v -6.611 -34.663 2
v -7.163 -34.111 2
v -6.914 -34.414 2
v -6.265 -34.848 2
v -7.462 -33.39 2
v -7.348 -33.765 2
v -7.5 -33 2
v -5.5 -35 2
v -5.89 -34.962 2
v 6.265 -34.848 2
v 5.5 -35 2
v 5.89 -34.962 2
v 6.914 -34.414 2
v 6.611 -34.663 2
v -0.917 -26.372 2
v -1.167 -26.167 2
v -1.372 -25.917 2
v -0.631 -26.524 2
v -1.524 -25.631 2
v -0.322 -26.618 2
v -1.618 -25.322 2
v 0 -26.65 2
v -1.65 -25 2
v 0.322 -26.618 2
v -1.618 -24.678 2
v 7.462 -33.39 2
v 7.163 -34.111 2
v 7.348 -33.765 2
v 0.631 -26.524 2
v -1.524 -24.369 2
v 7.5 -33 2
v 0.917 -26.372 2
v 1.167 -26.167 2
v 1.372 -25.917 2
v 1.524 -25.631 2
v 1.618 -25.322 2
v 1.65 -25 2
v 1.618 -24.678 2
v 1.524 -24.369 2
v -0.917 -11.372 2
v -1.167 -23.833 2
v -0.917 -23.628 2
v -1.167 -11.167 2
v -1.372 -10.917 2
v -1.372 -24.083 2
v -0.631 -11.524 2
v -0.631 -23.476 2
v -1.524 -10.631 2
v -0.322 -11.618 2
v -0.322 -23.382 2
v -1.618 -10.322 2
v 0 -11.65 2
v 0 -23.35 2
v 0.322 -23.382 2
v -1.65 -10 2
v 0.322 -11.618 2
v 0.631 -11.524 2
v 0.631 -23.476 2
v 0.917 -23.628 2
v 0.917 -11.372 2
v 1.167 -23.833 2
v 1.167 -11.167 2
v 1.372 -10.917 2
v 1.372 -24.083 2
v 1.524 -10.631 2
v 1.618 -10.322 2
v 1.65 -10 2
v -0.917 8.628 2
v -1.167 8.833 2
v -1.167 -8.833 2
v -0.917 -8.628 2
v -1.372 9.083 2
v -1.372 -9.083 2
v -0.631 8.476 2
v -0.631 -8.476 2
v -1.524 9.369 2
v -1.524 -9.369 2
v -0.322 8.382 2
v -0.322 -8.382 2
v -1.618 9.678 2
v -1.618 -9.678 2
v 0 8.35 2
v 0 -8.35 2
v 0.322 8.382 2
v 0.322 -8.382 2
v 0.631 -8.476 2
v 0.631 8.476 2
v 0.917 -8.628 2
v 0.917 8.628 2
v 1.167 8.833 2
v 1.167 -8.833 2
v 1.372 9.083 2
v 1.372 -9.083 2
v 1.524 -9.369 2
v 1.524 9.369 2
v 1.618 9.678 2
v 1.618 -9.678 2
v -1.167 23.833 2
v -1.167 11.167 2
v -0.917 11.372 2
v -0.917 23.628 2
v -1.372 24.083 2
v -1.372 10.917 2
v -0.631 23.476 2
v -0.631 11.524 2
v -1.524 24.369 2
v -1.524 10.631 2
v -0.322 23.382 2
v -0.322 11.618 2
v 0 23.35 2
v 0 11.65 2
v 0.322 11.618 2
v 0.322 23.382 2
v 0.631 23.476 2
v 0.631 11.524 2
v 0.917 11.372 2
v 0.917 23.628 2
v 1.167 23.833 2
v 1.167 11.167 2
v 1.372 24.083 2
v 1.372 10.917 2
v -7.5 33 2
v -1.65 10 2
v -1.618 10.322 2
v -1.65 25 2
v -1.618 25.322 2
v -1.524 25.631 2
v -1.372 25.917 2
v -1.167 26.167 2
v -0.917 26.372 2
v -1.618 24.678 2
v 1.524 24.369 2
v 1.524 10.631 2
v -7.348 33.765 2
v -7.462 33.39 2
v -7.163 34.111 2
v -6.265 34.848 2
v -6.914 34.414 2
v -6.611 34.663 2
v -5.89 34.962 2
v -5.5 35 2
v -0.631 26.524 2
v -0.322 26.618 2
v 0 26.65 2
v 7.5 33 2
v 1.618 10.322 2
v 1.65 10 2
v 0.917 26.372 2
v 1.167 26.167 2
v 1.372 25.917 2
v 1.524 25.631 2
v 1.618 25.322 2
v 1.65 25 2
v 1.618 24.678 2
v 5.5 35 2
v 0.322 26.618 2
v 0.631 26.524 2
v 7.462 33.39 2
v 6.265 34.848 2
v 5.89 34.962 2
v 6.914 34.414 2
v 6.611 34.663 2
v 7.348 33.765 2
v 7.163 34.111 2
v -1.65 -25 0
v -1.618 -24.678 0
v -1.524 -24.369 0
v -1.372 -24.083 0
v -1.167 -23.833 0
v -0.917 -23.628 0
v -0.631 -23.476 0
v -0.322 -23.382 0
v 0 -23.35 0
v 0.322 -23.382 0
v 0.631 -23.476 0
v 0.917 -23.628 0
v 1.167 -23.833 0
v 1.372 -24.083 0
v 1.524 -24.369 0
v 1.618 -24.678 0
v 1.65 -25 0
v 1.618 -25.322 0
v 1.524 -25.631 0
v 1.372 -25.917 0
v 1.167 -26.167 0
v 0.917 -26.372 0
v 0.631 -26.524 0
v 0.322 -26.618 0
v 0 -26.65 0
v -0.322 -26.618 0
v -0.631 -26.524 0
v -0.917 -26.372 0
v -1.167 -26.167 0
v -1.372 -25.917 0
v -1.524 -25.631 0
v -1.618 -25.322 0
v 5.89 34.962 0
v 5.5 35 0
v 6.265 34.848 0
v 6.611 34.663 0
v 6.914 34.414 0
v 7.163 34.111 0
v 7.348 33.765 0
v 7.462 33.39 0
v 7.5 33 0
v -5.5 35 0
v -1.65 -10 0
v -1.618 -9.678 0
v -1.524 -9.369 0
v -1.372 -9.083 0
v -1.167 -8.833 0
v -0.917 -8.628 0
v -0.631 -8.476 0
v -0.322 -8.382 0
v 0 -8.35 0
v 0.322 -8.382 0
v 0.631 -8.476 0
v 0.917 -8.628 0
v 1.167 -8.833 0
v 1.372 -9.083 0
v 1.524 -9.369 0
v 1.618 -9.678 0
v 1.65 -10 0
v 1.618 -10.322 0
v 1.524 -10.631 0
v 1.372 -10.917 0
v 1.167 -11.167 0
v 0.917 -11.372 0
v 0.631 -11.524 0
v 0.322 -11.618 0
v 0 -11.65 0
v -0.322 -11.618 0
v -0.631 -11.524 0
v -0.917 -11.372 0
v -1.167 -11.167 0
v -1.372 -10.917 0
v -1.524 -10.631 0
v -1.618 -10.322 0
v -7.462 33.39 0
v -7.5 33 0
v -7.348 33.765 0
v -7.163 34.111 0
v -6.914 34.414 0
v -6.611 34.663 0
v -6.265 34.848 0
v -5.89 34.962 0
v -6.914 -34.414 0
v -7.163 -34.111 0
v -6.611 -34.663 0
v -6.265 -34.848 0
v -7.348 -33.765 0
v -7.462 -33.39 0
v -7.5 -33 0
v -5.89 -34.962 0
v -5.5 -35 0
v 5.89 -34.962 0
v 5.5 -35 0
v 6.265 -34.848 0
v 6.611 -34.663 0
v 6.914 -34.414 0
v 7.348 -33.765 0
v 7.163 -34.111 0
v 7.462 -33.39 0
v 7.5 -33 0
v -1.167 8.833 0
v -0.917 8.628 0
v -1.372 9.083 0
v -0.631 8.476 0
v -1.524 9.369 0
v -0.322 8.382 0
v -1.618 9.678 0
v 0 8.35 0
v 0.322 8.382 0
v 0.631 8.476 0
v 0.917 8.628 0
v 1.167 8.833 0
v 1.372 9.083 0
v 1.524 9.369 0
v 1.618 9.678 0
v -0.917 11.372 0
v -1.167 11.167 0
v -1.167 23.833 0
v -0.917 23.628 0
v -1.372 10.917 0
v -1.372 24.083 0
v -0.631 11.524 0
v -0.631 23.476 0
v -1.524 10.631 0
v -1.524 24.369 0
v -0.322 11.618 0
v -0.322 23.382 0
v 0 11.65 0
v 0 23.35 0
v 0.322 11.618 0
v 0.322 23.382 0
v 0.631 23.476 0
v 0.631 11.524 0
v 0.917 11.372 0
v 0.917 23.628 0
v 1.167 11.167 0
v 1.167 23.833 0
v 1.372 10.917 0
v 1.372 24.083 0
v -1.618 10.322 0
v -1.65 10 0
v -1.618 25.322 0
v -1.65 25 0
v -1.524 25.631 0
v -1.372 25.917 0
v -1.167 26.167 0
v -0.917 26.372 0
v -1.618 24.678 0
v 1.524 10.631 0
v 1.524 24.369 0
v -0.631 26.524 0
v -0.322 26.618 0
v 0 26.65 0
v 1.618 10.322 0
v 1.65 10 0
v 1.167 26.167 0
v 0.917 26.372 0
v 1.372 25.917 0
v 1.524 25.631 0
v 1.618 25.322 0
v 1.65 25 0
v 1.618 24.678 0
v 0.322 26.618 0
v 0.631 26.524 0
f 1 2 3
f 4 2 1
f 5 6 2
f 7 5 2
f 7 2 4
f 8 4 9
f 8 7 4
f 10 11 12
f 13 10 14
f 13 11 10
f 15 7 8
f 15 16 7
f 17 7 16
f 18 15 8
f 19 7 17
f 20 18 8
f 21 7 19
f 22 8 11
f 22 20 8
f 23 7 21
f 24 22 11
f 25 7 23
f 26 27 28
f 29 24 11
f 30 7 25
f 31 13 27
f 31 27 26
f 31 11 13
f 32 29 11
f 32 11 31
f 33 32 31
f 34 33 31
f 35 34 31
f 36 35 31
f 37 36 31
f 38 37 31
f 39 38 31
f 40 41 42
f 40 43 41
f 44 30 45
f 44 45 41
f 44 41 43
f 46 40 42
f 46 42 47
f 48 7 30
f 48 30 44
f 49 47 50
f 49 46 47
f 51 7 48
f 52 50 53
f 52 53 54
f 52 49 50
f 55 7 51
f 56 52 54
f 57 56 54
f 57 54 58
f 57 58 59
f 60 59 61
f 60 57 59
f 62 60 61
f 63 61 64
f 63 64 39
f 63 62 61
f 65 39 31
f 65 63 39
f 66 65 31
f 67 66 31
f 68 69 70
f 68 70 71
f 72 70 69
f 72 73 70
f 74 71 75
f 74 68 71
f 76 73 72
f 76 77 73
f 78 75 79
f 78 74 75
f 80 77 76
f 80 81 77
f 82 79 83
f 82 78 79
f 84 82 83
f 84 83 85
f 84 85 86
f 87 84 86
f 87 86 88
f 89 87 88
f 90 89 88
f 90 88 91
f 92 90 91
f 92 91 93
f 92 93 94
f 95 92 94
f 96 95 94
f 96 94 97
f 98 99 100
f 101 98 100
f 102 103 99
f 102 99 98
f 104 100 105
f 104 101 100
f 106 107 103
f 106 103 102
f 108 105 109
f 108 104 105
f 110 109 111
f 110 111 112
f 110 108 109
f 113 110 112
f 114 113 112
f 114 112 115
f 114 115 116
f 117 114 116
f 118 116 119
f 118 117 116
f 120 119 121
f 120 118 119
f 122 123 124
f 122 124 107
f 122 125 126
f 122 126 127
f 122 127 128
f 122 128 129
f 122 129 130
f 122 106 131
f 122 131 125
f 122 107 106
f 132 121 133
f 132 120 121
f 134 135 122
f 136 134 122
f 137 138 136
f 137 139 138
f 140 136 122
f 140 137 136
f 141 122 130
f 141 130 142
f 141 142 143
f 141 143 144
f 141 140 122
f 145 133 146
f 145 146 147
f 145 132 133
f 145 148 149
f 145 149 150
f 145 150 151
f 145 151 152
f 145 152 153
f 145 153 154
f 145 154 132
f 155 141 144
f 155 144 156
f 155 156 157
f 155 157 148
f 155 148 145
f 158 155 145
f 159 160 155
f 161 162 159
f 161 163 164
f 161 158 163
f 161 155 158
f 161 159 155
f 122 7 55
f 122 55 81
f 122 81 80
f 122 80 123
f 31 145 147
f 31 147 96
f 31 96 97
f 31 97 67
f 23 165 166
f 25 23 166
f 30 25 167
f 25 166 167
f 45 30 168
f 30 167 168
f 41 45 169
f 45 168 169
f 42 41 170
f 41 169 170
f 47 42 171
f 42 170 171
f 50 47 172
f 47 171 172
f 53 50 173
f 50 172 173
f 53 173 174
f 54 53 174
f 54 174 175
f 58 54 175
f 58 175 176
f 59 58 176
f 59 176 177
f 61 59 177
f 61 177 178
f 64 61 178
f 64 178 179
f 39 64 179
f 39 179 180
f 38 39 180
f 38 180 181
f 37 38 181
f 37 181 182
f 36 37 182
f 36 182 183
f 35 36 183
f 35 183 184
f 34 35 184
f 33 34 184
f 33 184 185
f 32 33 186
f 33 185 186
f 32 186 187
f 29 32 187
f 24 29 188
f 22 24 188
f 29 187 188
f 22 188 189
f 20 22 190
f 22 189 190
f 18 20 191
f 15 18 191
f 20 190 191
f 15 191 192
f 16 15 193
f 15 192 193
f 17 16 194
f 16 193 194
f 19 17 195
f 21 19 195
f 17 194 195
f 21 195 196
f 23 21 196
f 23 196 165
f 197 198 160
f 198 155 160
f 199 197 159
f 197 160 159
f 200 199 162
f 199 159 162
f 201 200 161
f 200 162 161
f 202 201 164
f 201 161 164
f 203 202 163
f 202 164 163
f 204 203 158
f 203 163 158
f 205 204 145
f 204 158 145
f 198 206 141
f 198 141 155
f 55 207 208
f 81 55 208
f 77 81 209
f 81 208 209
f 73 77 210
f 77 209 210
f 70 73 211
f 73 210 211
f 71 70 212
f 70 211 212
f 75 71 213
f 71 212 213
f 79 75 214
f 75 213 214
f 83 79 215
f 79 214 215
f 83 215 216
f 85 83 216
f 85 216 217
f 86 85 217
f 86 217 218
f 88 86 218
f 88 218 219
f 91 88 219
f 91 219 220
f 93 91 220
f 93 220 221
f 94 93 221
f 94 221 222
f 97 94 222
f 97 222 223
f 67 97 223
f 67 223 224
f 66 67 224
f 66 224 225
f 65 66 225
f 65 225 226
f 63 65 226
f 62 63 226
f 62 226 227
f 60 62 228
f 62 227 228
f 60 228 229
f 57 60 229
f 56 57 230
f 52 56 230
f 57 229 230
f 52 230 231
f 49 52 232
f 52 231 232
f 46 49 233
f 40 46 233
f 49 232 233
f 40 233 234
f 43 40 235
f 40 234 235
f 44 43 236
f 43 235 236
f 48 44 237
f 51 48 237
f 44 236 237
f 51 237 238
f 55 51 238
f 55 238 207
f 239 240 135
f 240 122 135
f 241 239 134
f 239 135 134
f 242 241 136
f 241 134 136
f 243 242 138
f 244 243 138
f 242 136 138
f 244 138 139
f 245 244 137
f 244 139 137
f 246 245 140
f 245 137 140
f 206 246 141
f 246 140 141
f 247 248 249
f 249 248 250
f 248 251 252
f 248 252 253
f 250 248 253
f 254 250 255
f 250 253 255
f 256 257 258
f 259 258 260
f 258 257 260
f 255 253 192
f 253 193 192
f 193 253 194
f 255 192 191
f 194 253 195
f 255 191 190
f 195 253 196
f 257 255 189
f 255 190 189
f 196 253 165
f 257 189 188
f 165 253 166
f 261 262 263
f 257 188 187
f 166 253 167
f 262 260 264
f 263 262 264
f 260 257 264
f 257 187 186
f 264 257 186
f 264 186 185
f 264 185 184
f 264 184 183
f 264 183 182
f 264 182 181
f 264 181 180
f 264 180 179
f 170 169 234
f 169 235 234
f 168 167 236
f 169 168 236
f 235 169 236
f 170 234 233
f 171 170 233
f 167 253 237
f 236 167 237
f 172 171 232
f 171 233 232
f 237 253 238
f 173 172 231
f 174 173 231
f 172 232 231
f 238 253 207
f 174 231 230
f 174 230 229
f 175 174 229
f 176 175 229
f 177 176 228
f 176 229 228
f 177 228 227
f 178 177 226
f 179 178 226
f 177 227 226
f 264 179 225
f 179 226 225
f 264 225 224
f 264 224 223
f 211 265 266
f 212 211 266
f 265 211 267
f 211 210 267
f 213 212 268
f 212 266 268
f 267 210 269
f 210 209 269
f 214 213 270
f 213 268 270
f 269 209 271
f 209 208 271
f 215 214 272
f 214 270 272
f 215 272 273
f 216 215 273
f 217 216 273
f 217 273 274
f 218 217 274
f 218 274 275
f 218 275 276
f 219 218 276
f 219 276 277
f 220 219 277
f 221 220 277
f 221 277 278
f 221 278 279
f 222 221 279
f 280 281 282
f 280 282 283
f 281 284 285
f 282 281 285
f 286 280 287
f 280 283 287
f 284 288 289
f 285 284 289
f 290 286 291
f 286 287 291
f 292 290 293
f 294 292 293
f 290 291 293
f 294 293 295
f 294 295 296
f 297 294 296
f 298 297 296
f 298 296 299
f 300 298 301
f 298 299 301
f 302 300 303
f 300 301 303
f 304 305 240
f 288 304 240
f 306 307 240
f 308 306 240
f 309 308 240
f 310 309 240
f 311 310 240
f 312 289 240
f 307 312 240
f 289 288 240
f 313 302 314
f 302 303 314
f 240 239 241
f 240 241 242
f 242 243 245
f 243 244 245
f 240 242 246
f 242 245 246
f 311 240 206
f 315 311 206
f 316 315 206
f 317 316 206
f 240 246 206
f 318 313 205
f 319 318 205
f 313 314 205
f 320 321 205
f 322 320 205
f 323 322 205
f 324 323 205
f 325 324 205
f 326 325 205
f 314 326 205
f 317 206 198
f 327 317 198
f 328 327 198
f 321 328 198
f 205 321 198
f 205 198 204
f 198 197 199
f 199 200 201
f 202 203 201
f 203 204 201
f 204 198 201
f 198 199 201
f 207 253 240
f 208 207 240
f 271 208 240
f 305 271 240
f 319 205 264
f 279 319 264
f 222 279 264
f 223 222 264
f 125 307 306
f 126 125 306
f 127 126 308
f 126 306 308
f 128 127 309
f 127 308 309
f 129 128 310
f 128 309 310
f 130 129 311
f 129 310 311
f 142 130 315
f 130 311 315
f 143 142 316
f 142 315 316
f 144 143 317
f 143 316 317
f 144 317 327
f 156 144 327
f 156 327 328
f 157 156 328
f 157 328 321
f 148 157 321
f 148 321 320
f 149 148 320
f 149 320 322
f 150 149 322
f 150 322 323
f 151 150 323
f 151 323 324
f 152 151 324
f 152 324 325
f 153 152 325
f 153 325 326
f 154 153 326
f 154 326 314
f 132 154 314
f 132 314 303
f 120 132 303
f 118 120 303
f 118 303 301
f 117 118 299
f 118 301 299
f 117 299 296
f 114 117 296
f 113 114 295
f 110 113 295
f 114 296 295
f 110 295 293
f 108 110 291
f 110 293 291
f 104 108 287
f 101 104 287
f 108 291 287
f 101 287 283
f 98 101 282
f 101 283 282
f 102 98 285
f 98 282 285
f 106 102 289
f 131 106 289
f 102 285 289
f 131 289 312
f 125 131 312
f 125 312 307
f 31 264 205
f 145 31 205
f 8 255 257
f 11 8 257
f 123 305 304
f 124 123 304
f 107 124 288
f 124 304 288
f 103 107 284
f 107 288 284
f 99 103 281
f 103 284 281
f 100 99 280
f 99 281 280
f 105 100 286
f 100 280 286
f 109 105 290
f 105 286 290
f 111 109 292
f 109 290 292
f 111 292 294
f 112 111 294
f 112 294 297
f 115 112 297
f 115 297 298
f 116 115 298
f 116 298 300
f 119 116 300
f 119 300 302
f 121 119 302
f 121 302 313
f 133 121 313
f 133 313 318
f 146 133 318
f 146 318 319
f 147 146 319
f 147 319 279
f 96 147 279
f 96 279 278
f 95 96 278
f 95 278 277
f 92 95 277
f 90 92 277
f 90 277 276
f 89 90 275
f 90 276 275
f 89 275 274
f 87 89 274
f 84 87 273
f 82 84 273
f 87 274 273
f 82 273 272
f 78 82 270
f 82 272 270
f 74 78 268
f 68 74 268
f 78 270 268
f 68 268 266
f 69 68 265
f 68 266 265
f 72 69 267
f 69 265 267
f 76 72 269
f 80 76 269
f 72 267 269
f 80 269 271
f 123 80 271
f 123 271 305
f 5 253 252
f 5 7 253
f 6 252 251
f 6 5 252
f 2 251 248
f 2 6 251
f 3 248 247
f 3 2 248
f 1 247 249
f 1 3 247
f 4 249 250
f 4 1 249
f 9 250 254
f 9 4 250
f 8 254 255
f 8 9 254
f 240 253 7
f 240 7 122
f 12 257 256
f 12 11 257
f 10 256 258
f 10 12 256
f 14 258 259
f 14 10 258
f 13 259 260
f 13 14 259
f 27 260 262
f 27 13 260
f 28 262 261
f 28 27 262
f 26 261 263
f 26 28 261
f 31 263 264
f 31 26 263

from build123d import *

# Parameters (mm, degrees)
SKETCH_1_W            = 15
SKETCH_1_H            = 70
EXTRUDE_1_DEPTH       = 2
HOLE_WIZARD_M41_D     = 3.3
HOLE_WIZARD_M41_DEPTH = 11.5
HOLE_WIZARD_M41_TIP   = 0.991420021
FILLET_1_R            = 2


with BuildPart() as part:
    # Эскиз1 → Бобышка-Вытянуть1 (new body)
    with BuildSketch(Plane.XY):
        Rectangle(SKETCH_1_W, SKETCH_1_H)
    extrude(amount=EXTRUDE_1_DEPTH)

    # Отверстие обработанное метчиком M41
    with Locations(Plane.XY.offset(2)):
        with Locations((0, 25), (0, -25), (0, -10), (0, 10)):
            Hole(HOLE_WIZARD_M41_D / 2, depth=HOLE_WIZARD_M41_DEPTH)
            with Locations((0, 0, -(HOLE_WIZARD_M41_DEPTH + HOLE_WIZARD_M41_TIP / 2))):  # 118° drill point
                Cone(0, HOLE_WIZARD_M41_D / 2, HOLE_WIZARD_M41_TIP, mode=Mode.SUBTRACT)

    # Скругление1
    fillet_1_edges = [part.edges().sort_by_distance(p)[0] for p in [
        (7.5, -35, 1),
        (-7.5, -35, 1),
        (-7.5, 35, 1),
        (7.5, 35, 1),
    ]]
    fillet(fillet_1_edges, radius=FILLET_1_R)


solid = part.part
